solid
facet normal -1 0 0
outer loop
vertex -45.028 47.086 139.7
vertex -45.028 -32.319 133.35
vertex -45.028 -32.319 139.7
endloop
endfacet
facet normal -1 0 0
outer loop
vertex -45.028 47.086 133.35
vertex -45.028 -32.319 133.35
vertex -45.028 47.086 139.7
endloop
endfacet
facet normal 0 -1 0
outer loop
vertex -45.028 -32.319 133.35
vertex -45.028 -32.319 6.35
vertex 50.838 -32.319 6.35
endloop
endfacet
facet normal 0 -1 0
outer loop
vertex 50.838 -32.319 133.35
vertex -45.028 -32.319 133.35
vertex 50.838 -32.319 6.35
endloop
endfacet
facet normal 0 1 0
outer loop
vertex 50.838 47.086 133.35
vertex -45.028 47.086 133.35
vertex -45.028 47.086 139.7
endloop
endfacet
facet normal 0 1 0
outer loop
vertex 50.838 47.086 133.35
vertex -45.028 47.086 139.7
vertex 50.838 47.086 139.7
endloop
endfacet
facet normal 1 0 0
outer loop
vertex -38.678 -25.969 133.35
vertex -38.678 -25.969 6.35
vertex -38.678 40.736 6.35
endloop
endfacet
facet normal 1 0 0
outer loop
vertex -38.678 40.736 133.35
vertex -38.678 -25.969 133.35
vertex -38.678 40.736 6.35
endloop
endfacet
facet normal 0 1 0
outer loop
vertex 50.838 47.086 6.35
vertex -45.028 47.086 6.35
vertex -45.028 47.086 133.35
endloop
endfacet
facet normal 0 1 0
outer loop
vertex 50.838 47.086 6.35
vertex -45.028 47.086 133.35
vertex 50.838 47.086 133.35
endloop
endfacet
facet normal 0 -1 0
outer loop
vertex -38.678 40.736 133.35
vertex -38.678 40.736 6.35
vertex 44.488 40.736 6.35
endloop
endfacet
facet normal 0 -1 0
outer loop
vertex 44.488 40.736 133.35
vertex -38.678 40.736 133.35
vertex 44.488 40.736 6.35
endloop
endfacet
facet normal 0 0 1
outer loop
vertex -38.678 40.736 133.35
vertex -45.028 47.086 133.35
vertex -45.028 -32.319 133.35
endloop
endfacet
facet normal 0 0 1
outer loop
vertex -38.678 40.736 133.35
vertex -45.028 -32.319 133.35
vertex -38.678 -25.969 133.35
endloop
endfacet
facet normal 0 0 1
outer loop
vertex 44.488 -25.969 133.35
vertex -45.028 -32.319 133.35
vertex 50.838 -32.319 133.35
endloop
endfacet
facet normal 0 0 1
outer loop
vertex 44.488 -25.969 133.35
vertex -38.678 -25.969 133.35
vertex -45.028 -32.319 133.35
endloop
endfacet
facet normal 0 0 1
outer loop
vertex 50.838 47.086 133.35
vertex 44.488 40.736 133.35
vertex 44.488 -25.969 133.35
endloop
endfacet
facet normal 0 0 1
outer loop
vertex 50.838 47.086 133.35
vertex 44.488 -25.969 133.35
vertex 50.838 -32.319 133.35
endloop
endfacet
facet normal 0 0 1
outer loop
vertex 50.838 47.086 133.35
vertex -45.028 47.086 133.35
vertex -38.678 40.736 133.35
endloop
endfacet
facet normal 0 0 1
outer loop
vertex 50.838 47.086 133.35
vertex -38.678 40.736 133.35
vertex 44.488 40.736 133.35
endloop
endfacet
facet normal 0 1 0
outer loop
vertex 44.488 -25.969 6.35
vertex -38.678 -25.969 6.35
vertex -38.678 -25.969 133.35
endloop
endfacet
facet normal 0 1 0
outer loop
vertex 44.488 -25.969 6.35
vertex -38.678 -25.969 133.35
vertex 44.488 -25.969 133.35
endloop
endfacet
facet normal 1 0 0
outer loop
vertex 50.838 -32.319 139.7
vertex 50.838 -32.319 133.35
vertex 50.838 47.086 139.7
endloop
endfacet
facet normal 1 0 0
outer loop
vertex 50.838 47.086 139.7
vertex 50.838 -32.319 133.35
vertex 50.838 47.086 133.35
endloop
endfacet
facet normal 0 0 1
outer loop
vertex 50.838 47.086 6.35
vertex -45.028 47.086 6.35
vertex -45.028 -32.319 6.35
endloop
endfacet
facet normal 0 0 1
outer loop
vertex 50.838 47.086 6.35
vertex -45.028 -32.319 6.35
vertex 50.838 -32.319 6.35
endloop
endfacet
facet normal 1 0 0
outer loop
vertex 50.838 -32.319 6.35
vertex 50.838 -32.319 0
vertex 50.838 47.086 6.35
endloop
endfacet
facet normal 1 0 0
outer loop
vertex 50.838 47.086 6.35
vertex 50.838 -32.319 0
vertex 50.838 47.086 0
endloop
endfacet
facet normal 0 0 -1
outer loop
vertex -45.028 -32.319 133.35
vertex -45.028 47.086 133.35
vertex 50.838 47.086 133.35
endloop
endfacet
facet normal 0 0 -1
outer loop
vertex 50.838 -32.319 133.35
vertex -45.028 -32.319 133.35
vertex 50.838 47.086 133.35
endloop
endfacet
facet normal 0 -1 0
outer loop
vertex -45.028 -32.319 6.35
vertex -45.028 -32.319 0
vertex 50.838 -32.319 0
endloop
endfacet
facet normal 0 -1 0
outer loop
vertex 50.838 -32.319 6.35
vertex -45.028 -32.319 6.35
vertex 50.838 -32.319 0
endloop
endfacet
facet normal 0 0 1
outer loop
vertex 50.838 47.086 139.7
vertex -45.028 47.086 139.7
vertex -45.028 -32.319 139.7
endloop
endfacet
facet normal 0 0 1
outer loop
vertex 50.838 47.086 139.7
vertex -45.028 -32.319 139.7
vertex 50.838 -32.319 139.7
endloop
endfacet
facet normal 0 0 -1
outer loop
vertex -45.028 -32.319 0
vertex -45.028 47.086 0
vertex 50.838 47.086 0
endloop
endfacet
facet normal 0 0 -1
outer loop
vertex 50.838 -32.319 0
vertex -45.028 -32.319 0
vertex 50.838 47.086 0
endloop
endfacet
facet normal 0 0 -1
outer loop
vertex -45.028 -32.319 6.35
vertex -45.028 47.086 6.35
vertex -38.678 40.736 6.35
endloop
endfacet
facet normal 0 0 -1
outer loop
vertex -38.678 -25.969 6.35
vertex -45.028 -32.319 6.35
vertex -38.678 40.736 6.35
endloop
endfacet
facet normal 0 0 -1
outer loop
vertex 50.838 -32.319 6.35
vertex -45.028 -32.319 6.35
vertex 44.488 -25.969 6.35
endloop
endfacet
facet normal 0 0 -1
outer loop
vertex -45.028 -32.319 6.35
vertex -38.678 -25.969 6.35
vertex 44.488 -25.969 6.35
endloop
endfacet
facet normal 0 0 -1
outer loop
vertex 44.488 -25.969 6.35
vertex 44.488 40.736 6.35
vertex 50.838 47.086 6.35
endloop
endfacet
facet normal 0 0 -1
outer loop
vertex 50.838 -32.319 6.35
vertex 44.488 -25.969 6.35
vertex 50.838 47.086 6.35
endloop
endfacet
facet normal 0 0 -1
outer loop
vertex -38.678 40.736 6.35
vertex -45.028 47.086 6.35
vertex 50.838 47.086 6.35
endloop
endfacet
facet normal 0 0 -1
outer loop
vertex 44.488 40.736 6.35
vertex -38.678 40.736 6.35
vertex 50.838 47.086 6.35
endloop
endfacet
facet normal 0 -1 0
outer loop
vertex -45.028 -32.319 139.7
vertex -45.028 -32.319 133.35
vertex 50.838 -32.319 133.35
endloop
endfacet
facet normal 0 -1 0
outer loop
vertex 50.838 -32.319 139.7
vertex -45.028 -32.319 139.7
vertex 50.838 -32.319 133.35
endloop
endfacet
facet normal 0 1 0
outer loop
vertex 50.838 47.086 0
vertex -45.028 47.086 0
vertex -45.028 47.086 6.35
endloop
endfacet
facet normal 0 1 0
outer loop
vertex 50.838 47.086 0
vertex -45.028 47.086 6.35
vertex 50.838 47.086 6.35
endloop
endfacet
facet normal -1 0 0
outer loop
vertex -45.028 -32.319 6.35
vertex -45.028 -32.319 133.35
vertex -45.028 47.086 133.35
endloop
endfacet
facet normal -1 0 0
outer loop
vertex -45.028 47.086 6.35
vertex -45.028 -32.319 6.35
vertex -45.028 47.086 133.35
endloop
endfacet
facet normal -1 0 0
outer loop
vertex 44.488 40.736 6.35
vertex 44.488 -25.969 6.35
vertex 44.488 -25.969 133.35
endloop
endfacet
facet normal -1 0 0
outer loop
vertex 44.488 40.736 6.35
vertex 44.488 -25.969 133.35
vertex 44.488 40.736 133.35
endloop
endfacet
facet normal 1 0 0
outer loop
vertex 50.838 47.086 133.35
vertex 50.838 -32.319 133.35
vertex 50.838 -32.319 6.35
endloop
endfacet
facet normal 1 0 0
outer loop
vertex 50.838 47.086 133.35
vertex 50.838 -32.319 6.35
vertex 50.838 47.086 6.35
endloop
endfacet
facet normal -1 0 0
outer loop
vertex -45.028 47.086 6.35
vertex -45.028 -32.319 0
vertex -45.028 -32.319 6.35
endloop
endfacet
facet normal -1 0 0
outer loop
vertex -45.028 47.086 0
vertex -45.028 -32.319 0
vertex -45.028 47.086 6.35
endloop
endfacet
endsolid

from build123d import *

# Parameters (mm, degrees)
F0_W     = 95.8667472005
F0_H     = 79.4047825038
F1_DEPTH = 6.35
F3_W     = 95.8667472005
F3_H     = 79.4047825038
F3_W_2   = 83.1667472005
F3_H_2   = 66.7047825038
F4_DEPTH = 127
F6_W     = 95.8667472005
F6_H     = 79.4047825038
F7_DEPTH = 6.35


with BuildPart() as f1:
    # F0 (on Top) → F1 (new body)
    with BuildSketch(Plane.XY):
        with Locations((2.9050521553, 7.3836762458)):
            Rectangle(F0_W, F0_H)
    extrude(amount=F1_DEPTH)


with BuildPart() as f4:
    # F3 (on offset) → F4 (new body)
    with BuildSketch(Plane.XY.offset(6.35)):
        with Locations((2.9050521553, 7.3836762458)):
            Rectangle(F3_W, F3_H)
        with Locations((2.9050521553, 7.3836762458)):
            Rectangle(F3_W_2, F3_H_2, mode=Mode.SUBTRACT)
    extrude(amount=F4_DEPTH)


with BuildPart() as f7:
    # F6 (on offset) → F7 (new body)
    with BuildSketch(Plane.XY.offset(133.35)):
        with Locations((2.9050521553, 7.3836762458)):
            Rectangle(F6_W, F6_H)
    extrude(amount=F7_DEPTH)


solid = Compound([f1.part, f4.part, f7.part])
